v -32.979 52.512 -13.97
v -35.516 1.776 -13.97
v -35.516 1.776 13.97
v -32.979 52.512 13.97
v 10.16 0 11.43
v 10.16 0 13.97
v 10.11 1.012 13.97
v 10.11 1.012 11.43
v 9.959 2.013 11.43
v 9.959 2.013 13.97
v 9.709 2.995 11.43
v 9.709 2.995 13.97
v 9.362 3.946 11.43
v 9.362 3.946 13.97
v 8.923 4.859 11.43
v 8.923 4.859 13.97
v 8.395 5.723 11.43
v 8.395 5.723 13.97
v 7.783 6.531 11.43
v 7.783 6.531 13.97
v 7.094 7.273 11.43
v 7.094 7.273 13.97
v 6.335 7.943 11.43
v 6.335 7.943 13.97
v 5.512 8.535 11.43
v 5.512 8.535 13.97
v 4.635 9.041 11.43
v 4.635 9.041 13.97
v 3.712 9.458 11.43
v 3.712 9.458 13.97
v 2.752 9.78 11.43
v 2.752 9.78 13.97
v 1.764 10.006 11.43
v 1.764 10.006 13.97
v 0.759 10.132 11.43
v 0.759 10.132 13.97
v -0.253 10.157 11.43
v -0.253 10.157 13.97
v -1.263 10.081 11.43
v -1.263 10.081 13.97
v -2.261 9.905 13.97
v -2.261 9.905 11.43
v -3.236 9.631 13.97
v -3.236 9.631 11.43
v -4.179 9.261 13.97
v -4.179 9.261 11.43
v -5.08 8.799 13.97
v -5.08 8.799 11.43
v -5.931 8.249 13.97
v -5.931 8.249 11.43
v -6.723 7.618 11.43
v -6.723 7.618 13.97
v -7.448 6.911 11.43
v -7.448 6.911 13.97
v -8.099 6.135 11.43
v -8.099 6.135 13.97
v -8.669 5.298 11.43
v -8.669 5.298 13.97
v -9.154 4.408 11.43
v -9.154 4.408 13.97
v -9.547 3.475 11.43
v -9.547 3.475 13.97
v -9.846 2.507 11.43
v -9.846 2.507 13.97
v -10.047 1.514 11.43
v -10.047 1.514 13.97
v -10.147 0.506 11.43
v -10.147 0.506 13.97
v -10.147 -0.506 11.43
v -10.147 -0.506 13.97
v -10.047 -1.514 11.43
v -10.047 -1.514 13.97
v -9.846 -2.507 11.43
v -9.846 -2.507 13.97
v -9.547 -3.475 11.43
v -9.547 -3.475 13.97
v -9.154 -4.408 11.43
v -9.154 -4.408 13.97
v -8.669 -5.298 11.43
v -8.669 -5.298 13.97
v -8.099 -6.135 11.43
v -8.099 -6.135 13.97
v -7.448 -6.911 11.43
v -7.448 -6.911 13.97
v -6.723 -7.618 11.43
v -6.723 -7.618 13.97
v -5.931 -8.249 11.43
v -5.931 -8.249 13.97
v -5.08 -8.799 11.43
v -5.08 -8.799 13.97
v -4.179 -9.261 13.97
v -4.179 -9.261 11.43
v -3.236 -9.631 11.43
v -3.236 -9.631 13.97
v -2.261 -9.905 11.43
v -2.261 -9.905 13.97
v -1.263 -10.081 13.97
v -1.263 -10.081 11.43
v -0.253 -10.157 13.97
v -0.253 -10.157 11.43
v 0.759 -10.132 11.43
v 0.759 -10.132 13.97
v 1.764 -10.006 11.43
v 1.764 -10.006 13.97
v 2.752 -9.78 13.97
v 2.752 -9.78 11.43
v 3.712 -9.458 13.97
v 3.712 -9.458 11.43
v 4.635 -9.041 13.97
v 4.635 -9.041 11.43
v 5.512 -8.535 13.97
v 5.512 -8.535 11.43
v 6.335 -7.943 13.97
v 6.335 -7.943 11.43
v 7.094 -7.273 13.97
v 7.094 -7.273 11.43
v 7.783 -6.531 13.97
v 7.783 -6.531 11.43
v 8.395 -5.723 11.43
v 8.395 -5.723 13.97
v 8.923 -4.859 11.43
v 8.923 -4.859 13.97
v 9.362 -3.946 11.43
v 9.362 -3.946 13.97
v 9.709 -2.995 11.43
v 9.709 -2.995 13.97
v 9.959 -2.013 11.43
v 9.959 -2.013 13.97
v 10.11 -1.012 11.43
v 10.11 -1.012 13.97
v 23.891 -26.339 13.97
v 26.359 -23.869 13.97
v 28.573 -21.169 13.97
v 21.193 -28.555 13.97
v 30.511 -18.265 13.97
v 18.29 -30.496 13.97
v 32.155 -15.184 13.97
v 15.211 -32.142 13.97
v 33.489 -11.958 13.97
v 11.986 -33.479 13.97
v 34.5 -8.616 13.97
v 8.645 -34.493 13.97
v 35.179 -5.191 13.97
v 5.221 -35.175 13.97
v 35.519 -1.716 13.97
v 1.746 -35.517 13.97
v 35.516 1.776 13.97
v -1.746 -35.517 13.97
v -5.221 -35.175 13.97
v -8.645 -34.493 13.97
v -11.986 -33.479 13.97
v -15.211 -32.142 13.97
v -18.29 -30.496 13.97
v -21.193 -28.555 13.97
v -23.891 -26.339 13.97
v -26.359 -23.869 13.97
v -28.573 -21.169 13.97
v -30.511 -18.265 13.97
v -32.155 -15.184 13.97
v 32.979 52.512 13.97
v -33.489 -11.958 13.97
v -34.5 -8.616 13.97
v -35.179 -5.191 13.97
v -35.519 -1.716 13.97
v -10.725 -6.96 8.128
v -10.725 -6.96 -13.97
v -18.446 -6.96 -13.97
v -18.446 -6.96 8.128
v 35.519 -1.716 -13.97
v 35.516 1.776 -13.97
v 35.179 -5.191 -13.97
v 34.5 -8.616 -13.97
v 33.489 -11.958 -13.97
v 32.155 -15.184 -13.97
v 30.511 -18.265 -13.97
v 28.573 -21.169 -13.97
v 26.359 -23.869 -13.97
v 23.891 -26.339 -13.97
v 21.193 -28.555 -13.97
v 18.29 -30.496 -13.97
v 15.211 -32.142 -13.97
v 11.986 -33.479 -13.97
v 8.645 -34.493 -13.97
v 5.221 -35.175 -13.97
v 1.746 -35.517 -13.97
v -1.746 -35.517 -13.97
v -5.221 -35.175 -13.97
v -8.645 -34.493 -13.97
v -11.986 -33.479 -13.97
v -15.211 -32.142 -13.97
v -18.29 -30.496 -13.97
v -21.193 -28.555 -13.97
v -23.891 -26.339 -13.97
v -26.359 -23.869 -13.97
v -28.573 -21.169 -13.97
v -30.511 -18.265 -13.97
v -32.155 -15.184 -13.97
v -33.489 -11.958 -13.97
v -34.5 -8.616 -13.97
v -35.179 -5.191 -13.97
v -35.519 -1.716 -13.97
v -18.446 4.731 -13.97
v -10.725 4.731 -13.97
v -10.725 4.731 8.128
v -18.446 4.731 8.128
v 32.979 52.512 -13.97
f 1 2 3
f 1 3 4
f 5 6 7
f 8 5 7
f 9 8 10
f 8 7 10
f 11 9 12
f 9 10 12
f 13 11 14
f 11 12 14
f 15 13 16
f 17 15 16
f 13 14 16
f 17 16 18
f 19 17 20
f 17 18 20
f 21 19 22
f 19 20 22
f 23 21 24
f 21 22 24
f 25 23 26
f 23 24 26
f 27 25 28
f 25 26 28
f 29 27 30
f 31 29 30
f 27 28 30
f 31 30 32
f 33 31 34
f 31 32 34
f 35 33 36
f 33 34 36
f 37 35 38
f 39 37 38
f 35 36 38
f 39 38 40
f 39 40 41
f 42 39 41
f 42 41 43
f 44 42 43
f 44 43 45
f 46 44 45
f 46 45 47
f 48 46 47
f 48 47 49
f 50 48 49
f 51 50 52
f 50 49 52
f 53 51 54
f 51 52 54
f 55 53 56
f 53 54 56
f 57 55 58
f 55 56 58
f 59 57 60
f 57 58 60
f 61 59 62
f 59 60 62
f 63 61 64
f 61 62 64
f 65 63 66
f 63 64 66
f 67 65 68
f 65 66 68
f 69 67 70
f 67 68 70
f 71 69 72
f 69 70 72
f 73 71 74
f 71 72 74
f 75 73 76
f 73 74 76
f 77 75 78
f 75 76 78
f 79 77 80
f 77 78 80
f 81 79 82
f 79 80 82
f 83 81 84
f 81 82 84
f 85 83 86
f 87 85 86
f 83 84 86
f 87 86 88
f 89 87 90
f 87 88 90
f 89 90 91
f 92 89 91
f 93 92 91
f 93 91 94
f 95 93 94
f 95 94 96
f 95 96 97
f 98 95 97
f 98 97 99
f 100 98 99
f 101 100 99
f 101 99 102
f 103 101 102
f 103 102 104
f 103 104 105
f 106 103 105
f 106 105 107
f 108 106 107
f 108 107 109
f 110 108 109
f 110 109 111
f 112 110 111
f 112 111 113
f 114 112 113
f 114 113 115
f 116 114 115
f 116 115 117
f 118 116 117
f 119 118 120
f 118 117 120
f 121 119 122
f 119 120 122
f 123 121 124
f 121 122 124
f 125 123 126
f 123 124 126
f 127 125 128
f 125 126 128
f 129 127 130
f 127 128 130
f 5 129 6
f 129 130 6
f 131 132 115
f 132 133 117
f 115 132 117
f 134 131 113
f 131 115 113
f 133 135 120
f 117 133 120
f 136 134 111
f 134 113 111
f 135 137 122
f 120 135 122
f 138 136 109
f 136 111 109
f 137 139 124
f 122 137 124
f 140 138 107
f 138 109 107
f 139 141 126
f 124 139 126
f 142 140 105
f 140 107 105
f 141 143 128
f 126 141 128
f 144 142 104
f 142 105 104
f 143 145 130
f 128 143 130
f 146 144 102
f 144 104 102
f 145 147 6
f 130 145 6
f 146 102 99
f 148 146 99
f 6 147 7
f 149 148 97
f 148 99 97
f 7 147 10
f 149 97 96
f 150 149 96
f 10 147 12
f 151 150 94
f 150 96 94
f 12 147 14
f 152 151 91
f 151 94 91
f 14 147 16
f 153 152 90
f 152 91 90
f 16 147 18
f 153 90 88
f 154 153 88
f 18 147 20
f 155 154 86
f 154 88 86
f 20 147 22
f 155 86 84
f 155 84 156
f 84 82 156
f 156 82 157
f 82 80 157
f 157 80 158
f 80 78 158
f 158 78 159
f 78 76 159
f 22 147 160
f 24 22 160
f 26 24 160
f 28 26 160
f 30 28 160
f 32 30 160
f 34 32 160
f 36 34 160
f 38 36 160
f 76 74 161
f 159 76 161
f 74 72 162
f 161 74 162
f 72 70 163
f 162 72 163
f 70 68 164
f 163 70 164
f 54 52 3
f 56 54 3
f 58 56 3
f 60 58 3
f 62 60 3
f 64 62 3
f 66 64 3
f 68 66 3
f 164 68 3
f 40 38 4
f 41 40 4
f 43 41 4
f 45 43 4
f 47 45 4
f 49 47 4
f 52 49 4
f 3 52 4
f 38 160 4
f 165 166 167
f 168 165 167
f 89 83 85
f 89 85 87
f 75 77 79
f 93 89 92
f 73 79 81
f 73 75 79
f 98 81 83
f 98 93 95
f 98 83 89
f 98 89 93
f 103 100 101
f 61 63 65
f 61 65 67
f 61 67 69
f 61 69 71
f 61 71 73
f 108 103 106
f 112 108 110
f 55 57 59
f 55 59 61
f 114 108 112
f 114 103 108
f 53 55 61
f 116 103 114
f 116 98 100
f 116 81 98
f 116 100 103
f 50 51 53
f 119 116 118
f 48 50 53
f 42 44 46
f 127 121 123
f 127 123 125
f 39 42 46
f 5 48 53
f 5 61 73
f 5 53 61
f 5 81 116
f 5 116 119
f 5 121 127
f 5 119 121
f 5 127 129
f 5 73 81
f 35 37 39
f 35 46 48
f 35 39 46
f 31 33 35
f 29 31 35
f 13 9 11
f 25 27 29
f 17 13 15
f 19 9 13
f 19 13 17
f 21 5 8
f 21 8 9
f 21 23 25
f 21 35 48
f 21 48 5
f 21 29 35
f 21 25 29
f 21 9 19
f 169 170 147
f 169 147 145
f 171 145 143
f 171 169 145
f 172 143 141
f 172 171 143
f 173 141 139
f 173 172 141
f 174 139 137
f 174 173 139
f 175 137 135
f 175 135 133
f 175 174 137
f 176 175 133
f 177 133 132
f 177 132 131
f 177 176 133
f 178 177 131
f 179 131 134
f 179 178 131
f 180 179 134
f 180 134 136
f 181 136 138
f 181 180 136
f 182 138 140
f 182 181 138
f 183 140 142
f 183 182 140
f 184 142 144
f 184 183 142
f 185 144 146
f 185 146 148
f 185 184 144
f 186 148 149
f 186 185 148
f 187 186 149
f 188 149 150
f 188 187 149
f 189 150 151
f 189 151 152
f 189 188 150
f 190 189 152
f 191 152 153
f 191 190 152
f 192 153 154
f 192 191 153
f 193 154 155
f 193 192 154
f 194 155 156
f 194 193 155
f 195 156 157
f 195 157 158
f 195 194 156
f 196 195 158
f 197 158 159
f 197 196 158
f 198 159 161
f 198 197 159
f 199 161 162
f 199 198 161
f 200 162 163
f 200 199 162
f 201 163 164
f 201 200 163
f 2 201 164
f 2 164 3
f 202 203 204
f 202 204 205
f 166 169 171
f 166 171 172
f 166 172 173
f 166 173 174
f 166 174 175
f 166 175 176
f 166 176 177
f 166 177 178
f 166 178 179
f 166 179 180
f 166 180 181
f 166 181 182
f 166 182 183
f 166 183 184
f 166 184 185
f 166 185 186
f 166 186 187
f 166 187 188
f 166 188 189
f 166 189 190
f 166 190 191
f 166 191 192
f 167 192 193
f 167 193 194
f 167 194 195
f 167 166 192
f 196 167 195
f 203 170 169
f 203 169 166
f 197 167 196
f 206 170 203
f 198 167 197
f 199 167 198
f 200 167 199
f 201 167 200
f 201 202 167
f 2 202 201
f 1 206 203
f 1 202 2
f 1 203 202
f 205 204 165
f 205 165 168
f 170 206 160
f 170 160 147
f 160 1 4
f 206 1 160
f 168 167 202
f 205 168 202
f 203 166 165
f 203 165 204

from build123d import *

# Parameters (mm, degrees)
BOSS_EXTRUDE1_DEPTH      = 13.97
BOSS_EXTRUDE1_DEPTH_BACK = 13.97
SKETCH3_R                = 10.16
CUT_EXTRUDE1_DEPTH       = 2.54
SKETCH5_W                = 7.720577833
SKETCH5_H                = 11.69140021
CUT_EXTRUDE3_DEPTH       = 22.098


with BuildPart() as part:
    # Sketch2 → Boss-Extrude1 (new, two sides: drawn at the far end of the back side and taken through both)
    with BuildSketch(Plane.XY.offset(-BOSS_EXTRUDE1_DEPTH_BACK)):
        with BuildLine():
            Line((-35.51563317, 1.775781659), (-32.97880223, 52.512400474))
            Line((-32.97880223, 52.512400474), (32.97880223, 52.512400474))
            Line((32.97880223, 52.512400474), (35.51563317, 1.775781659))
            ThreePointArc((35.51563317, 1.775781659), (0, -35.56), (-35.51563317, 1.775781659))
        make_face()
    extrude(amount=BOSS_EXTRUDE1_DEPTH + BOSS_EXTRUDE1_DEPTH_BACK)

    # Sketch3 → Cut-Extrude1 (cut)
    with BuildSketch(Plane.XY.offset(13.97)):
        Circle(SKETCH3_R)
    extrude(amount=-CUT_EXTRUDE1_DEPTH, mode=Mode.SUBTRACT)

    # Sketch5 → Cut-Extrude3 (cut)
    with BuildSketch(Plane(origin=(0, 0, -13.97), x_dir=(-1, 0, 0), z_dir=(0, 0, -1))):
        with Locations((14.585332616, -1.114418504)):
            Rectangle(SKETCH5_W, SKETCH5_H)
    extrude(amount=-CUT_EXTRUDE3_DEPTH, mode=Mode.SUBTRACT)


solid = part.part
